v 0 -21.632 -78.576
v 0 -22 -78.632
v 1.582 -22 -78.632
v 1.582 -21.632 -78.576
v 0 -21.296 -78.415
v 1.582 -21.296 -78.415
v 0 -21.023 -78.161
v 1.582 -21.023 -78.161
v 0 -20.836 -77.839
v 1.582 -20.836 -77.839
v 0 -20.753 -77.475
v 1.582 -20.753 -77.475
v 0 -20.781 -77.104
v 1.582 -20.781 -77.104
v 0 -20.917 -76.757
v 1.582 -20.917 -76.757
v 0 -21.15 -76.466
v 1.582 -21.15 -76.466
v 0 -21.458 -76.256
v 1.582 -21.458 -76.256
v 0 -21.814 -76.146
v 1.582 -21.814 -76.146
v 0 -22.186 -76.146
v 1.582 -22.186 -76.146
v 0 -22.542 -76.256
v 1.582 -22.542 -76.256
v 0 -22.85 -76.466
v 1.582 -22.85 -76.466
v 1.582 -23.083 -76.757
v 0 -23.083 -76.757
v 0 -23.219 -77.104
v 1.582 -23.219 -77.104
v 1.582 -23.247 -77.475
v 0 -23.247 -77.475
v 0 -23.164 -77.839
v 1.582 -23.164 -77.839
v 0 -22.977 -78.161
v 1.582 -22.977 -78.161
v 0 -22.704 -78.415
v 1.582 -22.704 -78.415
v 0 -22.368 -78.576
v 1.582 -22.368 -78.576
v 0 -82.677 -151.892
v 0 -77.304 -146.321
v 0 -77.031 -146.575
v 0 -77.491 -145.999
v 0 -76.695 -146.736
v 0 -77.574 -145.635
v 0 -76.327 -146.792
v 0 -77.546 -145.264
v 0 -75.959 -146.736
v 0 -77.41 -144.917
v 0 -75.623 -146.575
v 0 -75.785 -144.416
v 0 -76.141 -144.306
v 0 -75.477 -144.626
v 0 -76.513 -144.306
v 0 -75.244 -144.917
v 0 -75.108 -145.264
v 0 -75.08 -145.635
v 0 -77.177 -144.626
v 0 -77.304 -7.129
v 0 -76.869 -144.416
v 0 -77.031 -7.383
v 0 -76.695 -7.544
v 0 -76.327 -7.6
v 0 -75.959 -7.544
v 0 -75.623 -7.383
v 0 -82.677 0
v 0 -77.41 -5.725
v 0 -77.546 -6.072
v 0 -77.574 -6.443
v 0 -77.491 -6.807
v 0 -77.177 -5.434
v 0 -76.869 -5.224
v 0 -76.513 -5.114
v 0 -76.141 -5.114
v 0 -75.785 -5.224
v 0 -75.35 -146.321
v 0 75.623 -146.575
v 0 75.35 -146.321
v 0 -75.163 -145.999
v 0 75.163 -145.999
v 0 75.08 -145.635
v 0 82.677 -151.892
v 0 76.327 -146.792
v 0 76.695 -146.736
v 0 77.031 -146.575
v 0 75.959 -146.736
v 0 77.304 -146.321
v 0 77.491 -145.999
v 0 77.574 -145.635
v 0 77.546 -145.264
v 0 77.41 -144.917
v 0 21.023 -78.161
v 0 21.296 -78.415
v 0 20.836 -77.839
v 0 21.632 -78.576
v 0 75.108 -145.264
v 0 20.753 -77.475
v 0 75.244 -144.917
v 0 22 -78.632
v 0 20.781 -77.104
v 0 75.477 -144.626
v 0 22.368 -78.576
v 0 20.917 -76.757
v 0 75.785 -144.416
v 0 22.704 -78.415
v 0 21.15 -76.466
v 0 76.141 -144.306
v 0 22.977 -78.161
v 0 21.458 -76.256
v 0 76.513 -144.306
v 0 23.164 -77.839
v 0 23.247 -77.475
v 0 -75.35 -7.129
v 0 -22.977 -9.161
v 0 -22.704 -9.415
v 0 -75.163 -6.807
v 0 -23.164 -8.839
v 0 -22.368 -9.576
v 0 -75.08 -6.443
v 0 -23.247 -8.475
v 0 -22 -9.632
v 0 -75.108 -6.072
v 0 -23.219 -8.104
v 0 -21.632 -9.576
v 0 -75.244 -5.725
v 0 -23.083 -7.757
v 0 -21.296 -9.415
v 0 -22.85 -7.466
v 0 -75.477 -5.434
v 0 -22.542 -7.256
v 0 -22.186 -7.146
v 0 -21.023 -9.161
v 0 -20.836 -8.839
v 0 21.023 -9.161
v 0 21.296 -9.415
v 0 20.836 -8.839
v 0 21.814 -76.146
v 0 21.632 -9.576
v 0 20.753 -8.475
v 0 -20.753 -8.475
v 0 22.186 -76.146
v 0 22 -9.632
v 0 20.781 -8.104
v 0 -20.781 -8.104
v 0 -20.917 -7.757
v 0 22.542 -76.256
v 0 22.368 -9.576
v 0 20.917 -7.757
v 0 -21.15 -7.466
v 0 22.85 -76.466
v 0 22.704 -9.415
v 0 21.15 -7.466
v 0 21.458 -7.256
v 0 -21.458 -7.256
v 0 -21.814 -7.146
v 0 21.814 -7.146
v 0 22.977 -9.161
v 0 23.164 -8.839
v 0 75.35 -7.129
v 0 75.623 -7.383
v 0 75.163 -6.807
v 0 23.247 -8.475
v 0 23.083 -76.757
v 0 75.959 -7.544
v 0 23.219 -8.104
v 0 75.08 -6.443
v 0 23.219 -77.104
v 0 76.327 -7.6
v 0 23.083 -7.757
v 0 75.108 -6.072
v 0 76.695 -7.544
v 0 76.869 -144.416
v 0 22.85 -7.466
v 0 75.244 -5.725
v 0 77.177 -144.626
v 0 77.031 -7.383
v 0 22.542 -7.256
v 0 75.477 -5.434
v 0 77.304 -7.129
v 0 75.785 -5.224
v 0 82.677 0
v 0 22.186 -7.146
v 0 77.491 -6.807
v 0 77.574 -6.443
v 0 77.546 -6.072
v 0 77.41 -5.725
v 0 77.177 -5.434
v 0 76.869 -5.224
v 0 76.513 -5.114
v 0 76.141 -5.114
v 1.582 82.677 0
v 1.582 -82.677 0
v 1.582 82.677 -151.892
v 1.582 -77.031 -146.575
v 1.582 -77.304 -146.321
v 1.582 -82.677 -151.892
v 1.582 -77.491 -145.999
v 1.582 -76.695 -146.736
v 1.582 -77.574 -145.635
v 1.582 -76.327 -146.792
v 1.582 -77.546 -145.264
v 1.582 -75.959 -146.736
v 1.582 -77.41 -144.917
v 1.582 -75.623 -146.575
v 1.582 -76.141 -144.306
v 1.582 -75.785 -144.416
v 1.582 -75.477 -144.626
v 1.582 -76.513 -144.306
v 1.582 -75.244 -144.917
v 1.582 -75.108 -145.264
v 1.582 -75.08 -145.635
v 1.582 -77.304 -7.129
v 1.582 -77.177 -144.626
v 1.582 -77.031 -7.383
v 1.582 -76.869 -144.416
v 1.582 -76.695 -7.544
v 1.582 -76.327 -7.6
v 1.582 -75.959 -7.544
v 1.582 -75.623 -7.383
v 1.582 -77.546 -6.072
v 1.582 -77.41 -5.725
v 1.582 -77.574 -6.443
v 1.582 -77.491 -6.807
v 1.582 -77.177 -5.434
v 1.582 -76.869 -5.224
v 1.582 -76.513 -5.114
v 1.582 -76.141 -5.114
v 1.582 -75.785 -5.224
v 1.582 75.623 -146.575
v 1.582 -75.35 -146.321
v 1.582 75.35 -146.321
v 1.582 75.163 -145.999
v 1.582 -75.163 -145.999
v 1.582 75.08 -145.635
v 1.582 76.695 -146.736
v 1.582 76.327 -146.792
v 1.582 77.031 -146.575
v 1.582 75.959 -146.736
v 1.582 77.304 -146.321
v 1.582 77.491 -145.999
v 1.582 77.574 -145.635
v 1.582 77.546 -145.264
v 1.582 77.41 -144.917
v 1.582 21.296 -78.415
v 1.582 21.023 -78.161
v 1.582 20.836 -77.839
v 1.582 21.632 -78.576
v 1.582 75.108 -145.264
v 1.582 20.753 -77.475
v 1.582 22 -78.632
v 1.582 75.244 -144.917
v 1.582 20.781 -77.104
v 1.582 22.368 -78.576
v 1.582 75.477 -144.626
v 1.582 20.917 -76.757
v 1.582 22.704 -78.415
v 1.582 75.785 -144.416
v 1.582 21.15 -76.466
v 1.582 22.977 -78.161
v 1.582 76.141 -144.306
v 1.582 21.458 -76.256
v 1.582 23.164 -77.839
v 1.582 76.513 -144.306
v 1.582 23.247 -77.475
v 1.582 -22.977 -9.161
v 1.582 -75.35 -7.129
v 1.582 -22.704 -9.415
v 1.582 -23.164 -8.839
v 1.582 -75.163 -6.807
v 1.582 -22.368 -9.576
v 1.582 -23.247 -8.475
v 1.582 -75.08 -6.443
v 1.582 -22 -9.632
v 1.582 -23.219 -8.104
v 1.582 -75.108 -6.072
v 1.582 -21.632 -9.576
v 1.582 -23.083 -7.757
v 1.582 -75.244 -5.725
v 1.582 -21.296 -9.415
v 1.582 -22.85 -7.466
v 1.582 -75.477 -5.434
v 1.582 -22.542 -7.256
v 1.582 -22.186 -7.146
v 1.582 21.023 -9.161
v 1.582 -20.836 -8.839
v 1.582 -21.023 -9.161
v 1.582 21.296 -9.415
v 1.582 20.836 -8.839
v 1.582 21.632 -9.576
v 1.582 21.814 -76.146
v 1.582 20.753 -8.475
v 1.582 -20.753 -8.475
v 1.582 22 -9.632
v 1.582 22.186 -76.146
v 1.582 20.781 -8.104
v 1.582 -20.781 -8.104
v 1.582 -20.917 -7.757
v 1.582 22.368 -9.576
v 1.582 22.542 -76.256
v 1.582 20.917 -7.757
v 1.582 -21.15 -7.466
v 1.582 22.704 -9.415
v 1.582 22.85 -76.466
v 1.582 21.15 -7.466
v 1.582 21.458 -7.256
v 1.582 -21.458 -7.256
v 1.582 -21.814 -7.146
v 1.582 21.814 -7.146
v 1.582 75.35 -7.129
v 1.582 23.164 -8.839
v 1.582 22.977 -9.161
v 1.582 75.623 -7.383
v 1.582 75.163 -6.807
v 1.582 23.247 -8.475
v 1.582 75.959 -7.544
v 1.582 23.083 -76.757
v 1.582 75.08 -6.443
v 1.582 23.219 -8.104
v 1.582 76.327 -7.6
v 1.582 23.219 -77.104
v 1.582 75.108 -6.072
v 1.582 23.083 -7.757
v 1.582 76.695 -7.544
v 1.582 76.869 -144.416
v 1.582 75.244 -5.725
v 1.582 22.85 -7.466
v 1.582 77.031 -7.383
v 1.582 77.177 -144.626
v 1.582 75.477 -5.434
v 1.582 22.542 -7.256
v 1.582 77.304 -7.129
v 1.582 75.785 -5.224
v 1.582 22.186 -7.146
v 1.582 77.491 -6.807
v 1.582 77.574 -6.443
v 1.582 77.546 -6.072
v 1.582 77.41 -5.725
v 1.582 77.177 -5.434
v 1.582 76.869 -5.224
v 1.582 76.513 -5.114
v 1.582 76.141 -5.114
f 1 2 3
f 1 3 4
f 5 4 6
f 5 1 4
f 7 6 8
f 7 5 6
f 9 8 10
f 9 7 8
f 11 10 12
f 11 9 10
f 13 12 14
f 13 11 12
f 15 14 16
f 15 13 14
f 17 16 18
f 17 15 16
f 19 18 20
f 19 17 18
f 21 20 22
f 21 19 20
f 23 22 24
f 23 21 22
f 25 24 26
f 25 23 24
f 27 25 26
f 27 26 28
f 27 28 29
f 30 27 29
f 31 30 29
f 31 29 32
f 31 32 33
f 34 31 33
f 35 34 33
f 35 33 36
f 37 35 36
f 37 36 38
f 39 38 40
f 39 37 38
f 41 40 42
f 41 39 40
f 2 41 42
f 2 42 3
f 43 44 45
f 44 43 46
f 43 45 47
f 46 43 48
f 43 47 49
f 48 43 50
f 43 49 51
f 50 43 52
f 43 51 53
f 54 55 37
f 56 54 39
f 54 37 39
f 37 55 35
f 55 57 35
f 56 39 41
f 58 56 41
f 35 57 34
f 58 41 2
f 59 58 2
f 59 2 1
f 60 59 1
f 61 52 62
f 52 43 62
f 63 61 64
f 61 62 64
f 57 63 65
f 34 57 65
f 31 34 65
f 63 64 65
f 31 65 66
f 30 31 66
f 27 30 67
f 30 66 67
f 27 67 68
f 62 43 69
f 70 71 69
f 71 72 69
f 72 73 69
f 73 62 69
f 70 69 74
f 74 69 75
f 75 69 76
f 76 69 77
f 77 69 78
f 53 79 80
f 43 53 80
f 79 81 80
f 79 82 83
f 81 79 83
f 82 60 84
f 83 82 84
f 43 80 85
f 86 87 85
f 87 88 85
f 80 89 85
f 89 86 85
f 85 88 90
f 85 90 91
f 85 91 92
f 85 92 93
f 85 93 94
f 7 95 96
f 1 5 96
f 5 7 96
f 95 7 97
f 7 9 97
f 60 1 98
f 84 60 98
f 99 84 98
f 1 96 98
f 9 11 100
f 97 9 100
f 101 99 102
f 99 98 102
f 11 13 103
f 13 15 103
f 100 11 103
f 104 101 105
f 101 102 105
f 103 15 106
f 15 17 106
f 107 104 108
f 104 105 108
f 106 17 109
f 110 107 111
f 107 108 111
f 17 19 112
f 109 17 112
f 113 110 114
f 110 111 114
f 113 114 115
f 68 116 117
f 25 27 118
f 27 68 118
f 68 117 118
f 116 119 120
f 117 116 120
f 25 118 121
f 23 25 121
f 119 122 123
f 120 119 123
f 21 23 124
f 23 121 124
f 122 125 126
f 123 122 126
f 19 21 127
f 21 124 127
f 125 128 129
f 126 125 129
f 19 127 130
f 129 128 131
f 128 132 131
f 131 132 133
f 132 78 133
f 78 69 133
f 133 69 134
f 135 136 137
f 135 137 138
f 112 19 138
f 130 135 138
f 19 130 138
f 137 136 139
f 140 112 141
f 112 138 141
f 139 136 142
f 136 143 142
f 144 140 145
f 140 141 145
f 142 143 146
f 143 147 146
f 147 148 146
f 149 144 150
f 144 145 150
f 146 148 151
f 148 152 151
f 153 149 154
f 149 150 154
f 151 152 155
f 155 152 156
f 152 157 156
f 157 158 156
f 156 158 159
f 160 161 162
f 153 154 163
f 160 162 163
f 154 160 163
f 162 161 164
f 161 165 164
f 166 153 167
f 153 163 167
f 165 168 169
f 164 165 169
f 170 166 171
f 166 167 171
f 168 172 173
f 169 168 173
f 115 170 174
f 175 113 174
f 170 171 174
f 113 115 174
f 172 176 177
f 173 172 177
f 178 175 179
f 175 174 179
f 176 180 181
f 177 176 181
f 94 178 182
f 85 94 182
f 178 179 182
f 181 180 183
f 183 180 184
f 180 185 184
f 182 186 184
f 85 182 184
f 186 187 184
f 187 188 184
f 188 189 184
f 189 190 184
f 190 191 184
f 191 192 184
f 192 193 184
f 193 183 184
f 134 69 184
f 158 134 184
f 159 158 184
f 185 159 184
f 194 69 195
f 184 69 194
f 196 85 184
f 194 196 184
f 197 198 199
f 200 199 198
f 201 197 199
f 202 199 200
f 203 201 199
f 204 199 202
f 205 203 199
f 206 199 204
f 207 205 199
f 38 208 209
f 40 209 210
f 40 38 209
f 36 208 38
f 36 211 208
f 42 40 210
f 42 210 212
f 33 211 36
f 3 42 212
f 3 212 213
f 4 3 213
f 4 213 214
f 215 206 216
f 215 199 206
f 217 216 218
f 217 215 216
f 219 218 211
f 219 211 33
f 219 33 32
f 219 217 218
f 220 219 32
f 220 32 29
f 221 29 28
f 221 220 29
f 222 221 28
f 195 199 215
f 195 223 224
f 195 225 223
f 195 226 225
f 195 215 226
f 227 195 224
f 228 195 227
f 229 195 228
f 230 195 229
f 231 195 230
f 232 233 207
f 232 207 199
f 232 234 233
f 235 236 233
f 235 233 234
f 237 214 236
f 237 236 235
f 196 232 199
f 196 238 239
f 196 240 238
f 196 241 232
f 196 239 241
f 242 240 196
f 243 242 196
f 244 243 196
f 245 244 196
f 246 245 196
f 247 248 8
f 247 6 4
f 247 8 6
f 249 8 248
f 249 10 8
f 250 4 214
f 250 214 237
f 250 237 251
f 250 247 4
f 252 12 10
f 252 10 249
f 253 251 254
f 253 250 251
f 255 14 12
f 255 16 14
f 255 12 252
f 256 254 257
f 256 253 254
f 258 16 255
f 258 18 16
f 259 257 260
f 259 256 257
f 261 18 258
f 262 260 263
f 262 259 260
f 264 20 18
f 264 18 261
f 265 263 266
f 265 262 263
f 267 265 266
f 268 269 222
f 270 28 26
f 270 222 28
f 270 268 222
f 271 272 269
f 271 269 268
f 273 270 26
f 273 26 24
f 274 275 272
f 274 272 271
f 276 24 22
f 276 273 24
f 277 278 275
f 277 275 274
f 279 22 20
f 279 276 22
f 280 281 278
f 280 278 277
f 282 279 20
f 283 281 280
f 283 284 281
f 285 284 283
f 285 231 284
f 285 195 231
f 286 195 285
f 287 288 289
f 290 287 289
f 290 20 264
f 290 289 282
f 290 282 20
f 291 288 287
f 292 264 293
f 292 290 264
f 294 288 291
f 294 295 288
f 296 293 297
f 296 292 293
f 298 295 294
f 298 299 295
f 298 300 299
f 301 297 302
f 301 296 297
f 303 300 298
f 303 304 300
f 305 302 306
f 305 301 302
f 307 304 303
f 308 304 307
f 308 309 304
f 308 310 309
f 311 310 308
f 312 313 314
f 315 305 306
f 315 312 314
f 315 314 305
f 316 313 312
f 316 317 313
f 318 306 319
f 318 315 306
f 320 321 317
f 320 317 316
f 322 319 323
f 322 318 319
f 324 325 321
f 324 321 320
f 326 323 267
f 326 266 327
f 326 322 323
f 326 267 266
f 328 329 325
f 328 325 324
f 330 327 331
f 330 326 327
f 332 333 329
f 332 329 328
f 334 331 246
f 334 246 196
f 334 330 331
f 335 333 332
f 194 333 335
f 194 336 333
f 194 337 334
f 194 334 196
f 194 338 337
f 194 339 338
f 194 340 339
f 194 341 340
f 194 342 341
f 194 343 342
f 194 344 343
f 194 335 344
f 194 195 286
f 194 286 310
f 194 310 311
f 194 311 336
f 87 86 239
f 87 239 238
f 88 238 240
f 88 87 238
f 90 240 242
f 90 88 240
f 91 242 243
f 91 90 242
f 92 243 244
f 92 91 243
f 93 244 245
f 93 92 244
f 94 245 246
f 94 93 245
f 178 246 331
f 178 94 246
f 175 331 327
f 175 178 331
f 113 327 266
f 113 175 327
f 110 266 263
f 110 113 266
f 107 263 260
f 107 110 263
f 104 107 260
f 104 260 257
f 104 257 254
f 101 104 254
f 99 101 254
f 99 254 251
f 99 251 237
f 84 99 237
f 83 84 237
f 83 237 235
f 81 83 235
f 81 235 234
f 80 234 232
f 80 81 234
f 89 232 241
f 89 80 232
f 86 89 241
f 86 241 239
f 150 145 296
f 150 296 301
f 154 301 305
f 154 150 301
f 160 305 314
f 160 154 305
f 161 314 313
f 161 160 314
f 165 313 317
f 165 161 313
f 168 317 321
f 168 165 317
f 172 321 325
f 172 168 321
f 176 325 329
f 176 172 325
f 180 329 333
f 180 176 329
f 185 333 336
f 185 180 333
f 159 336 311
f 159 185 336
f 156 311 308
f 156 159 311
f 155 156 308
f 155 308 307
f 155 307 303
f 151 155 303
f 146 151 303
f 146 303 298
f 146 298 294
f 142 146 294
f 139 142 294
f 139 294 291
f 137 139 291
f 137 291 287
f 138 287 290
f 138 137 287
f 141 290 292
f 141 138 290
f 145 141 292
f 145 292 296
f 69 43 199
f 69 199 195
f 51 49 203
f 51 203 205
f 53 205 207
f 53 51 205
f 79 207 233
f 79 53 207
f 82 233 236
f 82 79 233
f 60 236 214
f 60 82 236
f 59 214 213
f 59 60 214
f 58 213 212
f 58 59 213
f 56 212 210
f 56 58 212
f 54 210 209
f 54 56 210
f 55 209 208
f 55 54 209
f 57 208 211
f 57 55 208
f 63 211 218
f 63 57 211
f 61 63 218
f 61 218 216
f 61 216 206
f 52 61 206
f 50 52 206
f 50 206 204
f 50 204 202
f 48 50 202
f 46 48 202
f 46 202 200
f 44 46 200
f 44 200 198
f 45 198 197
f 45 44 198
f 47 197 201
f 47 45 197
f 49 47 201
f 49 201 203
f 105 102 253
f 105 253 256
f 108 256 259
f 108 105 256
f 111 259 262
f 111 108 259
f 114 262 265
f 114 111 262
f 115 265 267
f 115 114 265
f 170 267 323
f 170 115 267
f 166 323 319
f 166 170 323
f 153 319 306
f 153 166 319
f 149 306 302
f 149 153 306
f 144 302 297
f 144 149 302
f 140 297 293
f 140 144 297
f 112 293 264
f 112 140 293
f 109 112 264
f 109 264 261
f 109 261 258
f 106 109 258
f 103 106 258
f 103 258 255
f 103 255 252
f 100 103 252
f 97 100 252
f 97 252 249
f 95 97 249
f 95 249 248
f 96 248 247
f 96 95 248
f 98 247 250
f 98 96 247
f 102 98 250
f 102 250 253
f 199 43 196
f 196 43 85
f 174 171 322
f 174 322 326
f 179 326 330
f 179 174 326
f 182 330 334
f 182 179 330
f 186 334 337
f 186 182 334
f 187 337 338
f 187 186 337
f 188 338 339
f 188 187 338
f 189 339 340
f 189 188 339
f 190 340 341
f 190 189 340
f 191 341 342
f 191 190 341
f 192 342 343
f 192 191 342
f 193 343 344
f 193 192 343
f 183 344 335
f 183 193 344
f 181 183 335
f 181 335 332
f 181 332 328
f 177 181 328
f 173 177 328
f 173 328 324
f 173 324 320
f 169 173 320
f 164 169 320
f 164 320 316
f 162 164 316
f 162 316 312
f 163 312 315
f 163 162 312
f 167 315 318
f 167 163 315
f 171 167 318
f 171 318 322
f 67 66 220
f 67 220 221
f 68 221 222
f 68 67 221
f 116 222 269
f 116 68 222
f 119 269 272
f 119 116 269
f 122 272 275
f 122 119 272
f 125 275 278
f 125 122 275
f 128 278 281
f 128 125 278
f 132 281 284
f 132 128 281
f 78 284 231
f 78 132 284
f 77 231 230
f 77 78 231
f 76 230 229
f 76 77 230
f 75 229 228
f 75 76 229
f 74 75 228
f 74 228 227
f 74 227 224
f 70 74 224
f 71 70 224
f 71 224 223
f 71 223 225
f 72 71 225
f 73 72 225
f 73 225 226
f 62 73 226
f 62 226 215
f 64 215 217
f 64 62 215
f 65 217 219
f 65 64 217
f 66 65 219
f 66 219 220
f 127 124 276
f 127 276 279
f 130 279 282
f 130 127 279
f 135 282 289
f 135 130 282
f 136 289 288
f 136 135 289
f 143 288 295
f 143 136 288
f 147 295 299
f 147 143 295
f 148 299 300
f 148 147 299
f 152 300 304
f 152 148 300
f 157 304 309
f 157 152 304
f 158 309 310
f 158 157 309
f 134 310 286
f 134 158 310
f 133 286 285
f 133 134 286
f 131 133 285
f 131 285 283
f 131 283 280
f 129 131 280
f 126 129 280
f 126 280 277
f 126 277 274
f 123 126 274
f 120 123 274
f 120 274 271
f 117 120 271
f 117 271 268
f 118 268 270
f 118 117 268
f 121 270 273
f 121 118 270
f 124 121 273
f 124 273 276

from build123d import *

# Parameters (mm, degrees)
SKETCH1_W           = 82.677
SKETCH1_H           = 151.892
SKETCH1_R           = 1.25
BOSS_EXTRUDE1_DEPTH = 1.58234


with BuildPart() as part:
    # Sketch1 → Boss-Extrude1 (new body)
    # profile 1 of 2: a face of its own
    with BuildSketch(Plane.YZ):
        with Locations((-41.3385, -75.946)):
            Rectangle(SKETCH1_W, SKETCH1_H)
        with Locations(Location((-76.327, -145.542, 0), (0, 0, 270))):
            Circle(SKETCH1_R, mode=Mode.SUBTRACT)
        with Locations(Location((-22, -77.382, 0), (0, 0, 270))):
            Circle(SKETCH1_R, mode=Mode.SUBTRACT)
        with Locations(Location((-76.327, -6.35, 0), (0, 0, 270))):
            Circle(SKETCH1_R, mode=Mode.SUBTRACT)
        with Locations(Location((-22, -8.382, 0), (0, 0, 270))):
            Circle(SKETCH1_R, mode=Mode.SUBTRACT)
    # profile 2 of 2: a face of its own
    with BuildSketch(Plane.YZ):
        with Locations((41.3385, -75.946)):
            Rectangle(SKETCH1_W, SKETCH1_H)
        with Locations(Location((76.327, -145.542, 0), (0, 0, 270))):
            Circle(SKETCH1_R, mode=Mode.SUBTRACT)
        with Locations(Location((22, -77.382, 0), (0, 0, 270))):
            Circle(SKETCH1_R, mode=Mode.SUBTRACT)
        with Locations(Location((22, -8.382, 0), (0, 0, 270))):
            Circle(SKETCH1_R, mode=Mode.SUBTRACT)
        with Locations(Location((76.327, -6.35, 0), (0, 0, 270))):
            Circle(SKETCH1_R, mode=Mode.SUBTRACT)
    extrude(amount=BOSS_EXTRUDE1_DEPTH)


solid = part.part
